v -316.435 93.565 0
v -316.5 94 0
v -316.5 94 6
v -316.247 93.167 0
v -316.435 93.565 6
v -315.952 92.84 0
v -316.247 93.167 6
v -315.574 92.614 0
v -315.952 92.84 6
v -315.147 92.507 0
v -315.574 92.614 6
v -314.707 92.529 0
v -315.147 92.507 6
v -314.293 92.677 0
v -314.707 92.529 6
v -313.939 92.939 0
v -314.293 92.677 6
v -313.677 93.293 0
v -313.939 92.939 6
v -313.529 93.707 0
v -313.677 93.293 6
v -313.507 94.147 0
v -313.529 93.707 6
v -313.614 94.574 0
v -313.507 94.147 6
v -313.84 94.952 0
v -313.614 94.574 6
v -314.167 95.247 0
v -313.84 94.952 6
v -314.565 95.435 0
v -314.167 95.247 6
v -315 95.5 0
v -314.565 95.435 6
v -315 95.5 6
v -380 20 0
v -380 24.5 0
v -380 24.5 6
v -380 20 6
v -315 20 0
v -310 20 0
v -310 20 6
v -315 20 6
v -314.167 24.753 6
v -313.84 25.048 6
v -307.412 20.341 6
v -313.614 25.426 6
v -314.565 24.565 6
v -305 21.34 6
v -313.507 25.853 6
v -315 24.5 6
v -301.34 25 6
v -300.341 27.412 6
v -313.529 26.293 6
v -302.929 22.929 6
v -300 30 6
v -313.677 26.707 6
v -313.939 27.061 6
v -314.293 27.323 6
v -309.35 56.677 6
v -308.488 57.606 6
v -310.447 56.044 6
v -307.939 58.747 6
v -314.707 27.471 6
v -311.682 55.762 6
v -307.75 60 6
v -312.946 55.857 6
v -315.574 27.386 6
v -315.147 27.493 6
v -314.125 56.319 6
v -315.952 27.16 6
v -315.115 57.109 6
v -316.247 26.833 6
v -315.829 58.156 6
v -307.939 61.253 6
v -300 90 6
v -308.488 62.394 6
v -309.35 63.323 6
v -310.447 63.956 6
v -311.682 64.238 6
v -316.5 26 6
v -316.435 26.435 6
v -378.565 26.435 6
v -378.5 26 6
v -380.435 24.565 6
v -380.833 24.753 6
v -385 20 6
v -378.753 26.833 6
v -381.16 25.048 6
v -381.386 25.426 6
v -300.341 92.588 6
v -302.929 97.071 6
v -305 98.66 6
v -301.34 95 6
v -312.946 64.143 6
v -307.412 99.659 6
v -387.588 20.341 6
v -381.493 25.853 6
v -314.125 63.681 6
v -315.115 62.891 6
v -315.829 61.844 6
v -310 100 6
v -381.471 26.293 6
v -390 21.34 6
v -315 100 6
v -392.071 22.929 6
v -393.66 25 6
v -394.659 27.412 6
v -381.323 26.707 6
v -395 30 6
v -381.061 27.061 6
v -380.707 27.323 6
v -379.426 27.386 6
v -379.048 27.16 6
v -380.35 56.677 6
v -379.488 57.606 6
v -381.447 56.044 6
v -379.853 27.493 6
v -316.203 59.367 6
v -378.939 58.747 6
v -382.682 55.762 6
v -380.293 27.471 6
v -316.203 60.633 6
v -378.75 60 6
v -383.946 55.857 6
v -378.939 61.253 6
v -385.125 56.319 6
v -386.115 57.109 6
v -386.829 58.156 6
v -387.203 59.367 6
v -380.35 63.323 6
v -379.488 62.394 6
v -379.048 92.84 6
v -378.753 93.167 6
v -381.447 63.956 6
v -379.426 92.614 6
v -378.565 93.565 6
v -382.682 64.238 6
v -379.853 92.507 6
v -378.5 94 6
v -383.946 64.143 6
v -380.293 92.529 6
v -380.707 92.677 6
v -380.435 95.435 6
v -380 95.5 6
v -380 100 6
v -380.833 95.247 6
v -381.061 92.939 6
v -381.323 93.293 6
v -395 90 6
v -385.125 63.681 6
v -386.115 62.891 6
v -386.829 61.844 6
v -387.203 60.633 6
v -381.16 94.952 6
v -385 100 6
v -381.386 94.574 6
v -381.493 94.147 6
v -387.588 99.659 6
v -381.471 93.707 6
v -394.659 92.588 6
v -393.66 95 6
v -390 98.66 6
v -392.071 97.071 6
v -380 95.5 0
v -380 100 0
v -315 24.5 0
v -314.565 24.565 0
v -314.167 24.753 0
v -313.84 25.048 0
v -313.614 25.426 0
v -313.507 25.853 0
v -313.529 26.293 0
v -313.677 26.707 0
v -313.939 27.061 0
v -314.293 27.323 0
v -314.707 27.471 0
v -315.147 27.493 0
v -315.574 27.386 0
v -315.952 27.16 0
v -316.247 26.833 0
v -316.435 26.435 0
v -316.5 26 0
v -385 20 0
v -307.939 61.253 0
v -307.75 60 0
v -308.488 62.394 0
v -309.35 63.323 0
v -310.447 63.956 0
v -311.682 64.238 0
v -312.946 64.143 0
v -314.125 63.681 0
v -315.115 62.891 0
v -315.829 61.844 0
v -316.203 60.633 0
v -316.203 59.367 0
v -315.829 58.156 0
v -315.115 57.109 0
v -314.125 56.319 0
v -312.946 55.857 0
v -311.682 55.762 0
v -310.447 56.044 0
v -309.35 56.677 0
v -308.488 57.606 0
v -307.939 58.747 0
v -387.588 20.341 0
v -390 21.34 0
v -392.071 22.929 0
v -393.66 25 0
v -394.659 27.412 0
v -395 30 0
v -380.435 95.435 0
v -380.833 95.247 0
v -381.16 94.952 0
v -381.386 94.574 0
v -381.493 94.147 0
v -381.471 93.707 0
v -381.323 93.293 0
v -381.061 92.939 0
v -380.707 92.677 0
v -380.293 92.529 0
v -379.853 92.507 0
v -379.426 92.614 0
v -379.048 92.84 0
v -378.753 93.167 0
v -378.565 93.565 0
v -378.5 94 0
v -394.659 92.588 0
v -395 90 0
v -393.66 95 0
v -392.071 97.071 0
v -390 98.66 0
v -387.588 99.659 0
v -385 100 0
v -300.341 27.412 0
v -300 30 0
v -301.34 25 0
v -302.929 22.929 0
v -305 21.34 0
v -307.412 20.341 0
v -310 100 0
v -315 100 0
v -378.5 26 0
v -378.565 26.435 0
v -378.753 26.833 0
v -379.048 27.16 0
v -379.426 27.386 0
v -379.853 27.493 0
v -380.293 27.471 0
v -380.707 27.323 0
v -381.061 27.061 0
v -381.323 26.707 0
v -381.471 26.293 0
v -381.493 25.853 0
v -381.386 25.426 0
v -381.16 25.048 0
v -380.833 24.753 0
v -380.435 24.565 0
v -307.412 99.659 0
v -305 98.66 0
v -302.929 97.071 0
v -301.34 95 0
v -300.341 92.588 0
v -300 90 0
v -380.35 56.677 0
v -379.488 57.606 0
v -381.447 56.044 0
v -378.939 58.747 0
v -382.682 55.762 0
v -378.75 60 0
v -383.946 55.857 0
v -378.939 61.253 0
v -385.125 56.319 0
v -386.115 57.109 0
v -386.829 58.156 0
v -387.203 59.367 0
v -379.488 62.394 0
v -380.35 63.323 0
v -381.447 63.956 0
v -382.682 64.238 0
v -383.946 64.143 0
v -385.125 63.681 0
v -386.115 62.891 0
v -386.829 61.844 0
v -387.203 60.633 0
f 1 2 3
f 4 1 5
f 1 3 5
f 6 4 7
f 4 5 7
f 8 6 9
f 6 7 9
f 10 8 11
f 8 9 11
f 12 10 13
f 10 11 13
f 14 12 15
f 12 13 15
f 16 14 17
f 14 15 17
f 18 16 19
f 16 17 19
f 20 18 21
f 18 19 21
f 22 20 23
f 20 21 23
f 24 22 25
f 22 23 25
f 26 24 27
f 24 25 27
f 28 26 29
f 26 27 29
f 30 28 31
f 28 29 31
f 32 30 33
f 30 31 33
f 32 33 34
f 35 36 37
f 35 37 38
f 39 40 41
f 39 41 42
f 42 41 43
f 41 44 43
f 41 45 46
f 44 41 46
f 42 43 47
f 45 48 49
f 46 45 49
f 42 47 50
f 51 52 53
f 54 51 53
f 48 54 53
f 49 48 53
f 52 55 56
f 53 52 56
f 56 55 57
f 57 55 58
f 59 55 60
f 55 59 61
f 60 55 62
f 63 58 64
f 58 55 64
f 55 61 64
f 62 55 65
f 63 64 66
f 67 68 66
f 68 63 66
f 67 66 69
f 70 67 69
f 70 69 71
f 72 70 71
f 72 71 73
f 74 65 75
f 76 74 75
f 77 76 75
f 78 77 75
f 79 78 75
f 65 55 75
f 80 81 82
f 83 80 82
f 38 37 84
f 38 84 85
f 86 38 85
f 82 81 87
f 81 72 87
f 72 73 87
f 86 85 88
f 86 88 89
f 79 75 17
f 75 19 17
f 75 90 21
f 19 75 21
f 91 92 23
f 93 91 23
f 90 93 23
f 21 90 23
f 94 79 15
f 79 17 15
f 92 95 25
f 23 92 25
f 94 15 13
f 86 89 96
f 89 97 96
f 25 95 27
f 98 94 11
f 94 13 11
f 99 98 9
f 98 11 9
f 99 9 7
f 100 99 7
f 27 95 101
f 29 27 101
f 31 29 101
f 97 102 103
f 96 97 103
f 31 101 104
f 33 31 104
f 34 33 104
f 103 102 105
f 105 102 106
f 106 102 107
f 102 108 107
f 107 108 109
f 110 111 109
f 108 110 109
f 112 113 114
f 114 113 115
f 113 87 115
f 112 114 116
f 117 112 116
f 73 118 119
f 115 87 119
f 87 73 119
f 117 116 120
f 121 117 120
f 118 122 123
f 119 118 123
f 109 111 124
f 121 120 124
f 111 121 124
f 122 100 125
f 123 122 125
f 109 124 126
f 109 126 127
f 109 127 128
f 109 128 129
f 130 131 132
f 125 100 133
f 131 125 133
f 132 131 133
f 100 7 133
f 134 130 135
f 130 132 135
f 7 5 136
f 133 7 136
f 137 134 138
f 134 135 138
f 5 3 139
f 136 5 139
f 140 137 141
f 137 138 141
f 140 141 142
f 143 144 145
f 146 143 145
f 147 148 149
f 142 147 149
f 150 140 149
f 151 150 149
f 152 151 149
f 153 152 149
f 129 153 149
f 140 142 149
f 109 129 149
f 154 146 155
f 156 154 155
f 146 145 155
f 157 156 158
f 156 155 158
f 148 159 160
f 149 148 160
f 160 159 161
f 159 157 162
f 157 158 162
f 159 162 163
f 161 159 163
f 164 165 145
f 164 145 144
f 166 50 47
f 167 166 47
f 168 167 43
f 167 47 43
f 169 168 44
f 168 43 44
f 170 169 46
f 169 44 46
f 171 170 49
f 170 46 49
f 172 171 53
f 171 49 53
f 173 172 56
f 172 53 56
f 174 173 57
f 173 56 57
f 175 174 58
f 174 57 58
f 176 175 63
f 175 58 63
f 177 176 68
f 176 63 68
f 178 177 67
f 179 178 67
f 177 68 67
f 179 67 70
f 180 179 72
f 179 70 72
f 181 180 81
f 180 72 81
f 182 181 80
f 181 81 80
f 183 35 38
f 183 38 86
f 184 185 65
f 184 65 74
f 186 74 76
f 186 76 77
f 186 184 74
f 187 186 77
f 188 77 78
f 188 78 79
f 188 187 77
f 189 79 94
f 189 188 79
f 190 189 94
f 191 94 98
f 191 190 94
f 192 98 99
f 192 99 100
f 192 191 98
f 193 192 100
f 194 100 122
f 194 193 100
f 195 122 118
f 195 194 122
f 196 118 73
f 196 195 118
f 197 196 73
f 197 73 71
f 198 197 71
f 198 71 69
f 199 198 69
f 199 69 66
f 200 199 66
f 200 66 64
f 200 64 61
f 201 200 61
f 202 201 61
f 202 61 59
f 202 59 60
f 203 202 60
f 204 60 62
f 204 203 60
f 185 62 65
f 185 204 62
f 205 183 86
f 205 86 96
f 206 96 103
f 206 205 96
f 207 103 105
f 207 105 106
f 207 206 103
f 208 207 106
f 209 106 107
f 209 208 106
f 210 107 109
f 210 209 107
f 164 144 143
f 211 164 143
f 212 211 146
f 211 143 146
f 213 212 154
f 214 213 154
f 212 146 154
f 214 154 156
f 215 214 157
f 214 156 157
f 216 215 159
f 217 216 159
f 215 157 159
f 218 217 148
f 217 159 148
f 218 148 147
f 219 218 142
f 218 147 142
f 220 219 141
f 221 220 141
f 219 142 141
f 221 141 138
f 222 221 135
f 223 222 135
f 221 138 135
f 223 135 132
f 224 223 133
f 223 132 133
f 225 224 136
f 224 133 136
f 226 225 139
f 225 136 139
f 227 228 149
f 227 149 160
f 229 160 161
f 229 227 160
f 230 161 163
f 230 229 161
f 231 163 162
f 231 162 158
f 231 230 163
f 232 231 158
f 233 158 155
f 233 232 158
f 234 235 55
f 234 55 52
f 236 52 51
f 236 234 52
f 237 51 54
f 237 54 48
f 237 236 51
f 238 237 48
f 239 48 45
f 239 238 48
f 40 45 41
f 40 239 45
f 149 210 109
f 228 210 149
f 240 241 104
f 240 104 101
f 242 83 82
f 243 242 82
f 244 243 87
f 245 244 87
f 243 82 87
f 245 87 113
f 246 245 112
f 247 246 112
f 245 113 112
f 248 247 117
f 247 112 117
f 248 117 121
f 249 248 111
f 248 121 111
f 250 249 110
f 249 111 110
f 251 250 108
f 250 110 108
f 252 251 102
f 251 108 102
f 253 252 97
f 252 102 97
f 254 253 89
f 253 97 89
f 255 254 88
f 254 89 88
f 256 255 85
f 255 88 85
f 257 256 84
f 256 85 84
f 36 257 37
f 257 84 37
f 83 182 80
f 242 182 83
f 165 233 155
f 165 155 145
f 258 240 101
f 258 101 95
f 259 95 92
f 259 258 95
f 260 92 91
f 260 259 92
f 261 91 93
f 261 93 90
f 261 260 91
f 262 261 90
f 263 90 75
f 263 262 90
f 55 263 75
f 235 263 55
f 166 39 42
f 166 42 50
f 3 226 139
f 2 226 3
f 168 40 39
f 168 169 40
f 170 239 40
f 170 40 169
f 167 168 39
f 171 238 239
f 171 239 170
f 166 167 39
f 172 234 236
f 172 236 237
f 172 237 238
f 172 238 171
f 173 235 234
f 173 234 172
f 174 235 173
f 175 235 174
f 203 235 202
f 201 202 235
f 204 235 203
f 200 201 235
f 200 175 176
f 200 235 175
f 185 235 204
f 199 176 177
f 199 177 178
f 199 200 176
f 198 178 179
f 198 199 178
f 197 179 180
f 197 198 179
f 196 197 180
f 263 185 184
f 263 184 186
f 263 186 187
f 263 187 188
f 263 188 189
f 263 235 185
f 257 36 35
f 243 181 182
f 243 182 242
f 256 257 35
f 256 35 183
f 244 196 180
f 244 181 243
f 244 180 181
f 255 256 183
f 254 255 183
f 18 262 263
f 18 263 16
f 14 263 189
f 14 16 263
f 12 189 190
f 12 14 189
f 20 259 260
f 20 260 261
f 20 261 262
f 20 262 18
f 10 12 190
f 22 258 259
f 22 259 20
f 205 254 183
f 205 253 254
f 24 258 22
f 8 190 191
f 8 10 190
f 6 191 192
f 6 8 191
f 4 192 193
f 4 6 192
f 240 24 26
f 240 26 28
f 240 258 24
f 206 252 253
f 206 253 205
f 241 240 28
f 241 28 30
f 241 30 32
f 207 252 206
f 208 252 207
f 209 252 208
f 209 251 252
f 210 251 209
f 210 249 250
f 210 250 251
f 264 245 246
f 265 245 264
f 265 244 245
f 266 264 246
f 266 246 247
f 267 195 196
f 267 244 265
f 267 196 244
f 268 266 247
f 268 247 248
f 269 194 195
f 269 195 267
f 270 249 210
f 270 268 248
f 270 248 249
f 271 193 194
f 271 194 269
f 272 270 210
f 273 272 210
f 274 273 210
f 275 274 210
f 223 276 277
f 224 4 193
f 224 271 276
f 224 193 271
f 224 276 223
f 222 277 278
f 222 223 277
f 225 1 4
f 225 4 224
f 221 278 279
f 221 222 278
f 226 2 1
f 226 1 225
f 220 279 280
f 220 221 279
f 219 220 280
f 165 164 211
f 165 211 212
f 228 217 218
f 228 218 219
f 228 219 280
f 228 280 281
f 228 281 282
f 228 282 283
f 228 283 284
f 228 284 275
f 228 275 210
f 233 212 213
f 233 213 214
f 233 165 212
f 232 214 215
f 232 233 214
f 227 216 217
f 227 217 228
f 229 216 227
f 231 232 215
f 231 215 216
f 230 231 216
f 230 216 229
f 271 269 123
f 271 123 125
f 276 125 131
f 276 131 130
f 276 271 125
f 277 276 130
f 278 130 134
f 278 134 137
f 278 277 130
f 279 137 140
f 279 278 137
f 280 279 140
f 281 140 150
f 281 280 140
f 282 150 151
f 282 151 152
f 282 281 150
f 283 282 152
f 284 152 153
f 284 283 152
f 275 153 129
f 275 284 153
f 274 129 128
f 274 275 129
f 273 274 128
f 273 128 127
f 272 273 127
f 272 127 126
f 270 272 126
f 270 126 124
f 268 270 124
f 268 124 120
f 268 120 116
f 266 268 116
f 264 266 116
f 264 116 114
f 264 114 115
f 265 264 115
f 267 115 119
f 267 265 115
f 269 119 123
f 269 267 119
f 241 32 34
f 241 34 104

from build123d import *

# Parameters (mm, degrees)
SKETCH1_R           = 4.25
BOSS_EXTRUDE1_DEPTH = 6
SKETCH2_R           = 1.5
CUT_EXTRUDE1_DEPTH  = 7


with BuildPart() as part:
    # Sketch1 → Boss-Extrude1 (new body)
    with BuildSketch(Plane.XY):
        with BuildLine():
            Line((-380, 94), (-315, 94))
            Line((-315, 94), (-315, 100))
            Line((-315, 100), (-310, 100))
            ThreePointArc((-310, 100), (-302.928932188, 97.071067812), (-300, 90))
            Line((-300, 90), (-300, 30))
            ThreePointArc((-300, 30), (-302.928932188, 22.928932188), (-310, 20))
            Line((-310, 20), (-315, 20))
            Line((-315, 20), (-315, 26))
            Line((-315, 26), (-380, 26))
            Line((-380, 26), (-380, 20))
            Line((-380, 20), (-385, 20))
            ThreePointArc((-385, 20), (-392.071067812, 22.928932188), (-395, 30))
            Line((-395, 30), (-395, 90))
            ThreePointArc((-395, 90), (-392.071067812, 97.071067812), (-385, 100))
            Line((-385, 100), (-380, 100))
            Line((-380, 100), (-380, 94))
        make_face()
        with Locations((-312, 60)):
            Circle(SKETCH1_R, mode=Mode.SUBTRACT)
        with Locations((-383, 60)):
            Circle(SKETCH1_R, mode=Mode.SUBTRACT)
    extrude(amount=BOSS_EXTRUDE1_DEPTH)

    # Sketch2 → Cut-Extrude1 (cut, through all)
    with BuildSketch(Plane.XY.offset(6)):
        with Locations((-380, 26)):
            Circle(SKETCH2_R)
        with Locations((-315, 26)):
            Circle(SKETCH2_R)
        with Locations((-380, 94)):
            Circle(SKETCH2_R)
        with Locations((-315, 94)):
            Circle(SKETCH2_R)
    extrude(amount=-CUT_EXTRUDE1_DEPTH, mode=Mode.SUBTRACT)


solid = part.part
